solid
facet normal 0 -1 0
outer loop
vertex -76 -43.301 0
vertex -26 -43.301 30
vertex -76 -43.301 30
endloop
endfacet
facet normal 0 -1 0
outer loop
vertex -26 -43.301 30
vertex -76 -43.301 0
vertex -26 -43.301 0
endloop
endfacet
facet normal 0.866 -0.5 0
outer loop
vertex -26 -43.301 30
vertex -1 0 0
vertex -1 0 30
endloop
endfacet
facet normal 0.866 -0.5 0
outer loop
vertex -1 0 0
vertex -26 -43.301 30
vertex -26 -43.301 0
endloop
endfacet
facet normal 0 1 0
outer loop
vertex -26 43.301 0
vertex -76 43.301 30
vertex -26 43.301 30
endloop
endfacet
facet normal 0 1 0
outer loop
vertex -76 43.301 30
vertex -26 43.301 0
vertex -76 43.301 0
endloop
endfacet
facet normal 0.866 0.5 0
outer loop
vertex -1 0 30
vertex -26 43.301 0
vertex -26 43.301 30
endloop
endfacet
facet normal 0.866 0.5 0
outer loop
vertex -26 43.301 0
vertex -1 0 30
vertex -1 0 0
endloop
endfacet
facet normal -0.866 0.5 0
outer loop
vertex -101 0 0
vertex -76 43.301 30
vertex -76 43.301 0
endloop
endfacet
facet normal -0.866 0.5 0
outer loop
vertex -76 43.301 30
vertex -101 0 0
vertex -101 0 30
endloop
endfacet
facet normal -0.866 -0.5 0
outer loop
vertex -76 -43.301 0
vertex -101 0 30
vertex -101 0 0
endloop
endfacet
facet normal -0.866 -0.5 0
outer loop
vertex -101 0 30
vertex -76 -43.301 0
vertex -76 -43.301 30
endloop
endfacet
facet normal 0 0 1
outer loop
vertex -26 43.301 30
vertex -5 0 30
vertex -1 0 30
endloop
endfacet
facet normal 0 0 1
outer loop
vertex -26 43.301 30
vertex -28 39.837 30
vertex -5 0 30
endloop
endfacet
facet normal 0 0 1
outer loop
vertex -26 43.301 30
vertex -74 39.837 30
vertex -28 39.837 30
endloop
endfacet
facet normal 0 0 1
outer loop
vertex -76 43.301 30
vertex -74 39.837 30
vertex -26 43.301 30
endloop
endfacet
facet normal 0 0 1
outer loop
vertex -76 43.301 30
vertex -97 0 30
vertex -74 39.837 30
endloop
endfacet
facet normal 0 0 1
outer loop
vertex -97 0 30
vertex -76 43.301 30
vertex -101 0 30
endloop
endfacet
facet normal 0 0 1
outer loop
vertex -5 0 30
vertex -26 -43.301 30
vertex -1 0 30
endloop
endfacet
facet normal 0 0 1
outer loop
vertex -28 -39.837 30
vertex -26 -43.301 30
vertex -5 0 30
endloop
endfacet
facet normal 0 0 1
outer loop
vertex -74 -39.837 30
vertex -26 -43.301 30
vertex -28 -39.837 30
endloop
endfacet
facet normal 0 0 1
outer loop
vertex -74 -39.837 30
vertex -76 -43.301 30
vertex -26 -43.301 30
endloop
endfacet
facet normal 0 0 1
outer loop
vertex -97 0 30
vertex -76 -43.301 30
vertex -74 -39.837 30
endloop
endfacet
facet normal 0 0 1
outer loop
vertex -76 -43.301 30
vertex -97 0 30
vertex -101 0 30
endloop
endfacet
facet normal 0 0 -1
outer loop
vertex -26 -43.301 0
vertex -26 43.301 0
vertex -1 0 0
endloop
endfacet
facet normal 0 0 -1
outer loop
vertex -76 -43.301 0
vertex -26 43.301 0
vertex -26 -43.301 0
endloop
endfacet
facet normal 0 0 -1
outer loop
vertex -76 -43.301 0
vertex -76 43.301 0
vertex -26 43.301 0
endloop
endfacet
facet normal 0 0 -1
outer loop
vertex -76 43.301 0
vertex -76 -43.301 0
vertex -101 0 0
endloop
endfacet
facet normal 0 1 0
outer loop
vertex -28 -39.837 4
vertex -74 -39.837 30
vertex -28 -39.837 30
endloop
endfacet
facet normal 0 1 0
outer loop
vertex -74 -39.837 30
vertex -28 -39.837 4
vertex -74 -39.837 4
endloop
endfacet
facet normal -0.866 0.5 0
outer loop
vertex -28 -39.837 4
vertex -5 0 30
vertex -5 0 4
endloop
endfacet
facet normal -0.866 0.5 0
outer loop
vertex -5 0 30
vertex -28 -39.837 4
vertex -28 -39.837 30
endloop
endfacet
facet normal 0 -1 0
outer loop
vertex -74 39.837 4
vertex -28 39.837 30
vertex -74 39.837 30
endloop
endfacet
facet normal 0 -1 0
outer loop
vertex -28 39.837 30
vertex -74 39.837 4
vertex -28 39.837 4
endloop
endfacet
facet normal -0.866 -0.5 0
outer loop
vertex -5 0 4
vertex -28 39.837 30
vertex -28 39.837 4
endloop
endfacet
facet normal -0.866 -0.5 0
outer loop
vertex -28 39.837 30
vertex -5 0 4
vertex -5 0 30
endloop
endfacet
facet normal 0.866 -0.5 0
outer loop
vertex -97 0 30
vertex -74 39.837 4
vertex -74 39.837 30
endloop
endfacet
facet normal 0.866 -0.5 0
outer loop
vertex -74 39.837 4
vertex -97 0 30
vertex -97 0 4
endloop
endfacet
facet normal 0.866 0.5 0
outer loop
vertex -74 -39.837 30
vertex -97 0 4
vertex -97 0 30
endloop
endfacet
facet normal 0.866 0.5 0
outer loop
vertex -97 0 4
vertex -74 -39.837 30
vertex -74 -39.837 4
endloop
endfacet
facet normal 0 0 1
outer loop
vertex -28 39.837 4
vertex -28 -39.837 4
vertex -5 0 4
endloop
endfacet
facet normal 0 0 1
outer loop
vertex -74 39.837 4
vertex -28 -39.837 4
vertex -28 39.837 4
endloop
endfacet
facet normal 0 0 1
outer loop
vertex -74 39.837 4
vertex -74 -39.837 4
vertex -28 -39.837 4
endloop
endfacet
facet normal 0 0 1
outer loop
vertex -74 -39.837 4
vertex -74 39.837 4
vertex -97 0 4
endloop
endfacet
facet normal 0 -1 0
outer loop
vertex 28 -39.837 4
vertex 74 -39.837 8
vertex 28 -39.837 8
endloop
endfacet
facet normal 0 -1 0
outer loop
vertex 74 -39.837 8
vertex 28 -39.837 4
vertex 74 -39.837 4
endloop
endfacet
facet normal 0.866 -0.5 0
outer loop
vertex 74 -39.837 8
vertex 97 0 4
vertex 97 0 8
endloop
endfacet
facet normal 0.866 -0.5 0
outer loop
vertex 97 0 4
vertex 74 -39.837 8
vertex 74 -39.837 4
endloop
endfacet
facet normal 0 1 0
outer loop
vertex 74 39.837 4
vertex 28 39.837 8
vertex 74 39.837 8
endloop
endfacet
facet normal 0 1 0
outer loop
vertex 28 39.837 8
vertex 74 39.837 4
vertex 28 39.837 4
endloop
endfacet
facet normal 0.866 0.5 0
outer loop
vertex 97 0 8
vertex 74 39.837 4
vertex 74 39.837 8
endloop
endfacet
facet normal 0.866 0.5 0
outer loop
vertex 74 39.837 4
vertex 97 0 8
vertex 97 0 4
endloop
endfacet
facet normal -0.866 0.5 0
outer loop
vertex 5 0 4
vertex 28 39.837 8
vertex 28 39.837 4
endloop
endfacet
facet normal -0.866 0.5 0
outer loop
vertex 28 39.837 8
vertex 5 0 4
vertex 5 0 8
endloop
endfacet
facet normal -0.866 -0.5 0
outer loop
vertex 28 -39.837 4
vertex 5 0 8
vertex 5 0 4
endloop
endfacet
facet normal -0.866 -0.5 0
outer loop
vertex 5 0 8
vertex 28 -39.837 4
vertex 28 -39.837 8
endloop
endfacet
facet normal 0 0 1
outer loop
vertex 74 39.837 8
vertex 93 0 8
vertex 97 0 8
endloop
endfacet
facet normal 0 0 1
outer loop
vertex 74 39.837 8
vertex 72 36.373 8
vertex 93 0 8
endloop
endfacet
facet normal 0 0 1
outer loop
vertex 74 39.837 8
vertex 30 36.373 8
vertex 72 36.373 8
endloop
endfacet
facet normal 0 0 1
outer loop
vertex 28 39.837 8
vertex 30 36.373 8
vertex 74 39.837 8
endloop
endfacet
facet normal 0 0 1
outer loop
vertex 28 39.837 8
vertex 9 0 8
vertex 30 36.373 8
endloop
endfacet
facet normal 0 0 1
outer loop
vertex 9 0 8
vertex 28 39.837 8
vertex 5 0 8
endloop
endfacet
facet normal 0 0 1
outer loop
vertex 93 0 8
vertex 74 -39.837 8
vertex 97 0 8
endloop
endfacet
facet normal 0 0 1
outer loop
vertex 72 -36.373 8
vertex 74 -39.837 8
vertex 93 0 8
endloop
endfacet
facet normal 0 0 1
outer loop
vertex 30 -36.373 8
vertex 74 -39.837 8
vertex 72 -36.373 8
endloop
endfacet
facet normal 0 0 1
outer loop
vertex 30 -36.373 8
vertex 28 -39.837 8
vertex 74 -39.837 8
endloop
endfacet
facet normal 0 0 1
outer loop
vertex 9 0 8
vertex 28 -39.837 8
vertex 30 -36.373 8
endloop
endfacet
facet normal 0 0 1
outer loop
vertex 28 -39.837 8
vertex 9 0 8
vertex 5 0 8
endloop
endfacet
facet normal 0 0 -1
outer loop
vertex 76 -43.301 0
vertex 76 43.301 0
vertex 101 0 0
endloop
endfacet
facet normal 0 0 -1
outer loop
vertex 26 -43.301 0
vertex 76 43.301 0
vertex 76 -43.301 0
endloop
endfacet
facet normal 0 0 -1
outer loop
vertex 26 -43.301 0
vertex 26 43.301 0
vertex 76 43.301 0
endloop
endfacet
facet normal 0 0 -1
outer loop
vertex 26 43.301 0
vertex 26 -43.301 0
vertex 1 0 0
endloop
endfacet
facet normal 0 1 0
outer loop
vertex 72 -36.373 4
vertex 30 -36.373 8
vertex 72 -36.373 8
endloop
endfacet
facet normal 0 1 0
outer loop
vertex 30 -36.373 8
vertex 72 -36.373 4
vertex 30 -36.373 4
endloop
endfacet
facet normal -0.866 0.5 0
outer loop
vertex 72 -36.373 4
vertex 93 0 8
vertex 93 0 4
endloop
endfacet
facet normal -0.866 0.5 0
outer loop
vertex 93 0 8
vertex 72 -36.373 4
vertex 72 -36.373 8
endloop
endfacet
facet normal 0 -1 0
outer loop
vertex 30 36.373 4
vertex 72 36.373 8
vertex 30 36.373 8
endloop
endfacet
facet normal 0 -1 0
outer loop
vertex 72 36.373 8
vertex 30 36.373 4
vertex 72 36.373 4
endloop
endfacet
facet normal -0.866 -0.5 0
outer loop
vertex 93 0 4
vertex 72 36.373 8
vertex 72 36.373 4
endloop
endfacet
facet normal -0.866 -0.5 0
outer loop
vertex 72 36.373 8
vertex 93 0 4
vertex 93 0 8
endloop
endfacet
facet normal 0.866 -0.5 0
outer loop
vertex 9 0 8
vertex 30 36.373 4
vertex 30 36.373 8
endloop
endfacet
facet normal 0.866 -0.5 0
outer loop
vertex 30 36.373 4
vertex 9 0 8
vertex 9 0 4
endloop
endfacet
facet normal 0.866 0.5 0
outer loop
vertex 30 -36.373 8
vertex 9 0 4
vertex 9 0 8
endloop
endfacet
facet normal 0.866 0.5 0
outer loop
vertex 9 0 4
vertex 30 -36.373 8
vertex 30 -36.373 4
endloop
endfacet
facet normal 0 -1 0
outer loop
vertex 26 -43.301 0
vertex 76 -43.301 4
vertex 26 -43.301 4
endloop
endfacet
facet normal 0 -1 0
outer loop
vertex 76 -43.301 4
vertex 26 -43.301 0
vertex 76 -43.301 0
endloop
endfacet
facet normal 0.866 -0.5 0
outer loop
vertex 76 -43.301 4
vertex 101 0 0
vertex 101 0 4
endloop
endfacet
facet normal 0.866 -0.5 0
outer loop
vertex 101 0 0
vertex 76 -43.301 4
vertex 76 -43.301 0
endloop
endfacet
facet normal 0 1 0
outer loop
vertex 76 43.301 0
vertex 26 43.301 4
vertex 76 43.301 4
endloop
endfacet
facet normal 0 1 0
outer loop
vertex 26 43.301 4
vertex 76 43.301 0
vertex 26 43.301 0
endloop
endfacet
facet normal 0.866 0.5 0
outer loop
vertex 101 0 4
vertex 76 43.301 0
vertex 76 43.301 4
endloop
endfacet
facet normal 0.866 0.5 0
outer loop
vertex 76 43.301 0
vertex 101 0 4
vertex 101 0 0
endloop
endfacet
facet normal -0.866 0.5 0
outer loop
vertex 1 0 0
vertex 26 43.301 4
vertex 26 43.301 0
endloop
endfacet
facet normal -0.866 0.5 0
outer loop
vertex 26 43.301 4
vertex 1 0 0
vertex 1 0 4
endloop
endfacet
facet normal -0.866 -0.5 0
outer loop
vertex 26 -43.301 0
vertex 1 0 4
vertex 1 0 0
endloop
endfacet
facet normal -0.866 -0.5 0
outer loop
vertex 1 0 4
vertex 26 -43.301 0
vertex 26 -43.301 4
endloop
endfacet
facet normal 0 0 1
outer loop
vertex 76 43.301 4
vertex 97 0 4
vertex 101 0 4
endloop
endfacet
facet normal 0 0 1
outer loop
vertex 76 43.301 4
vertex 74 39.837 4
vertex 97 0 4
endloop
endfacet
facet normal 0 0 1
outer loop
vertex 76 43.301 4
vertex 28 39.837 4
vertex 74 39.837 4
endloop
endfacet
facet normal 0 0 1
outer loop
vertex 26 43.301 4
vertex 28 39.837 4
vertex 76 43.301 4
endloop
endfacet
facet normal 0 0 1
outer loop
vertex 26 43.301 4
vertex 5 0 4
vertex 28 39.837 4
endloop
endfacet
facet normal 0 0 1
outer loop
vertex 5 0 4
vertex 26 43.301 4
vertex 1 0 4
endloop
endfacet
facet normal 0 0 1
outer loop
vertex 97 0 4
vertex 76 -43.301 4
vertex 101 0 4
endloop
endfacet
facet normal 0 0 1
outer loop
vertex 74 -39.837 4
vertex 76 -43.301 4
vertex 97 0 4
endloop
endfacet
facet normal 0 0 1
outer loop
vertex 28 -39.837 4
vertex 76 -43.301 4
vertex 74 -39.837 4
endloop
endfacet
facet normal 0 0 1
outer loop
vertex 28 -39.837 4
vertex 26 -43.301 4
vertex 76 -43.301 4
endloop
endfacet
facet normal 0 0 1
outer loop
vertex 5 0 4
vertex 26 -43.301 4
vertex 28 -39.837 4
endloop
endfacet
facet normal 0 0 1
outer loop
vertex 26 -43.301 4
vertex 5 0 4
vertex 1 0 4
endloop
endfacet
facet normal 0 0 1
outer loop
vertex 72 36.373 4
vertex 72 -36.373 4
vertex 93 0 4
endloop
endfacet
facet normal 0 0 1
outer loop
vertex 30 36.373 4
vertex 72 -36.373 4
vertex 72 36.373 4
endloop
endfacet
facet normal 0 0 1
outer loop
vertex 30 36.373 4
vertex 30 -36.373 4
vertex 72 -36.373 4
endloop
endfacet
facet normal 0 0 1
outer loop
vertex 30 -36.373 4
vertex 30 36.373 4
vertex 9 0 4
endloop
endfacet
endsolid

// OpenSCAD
show_options = "both";//[both,box,cap]

//in mm
height = 30;//[1:200]
//in mm
radius = 50;//[1:200]
sided = 6;//[3:100]
//in mm
wallthickness = 4;//[1:20]


if(show_options == "both" || show_options == "box")
translate([show_options == "both" ? -radius - 1 : 0,0,0])
difference(){
	cylinder(h = height, r = radius, $fn = sided);
	translate([0,0,wallthickness])
	cylinder(h = height, r = radius-wallthickness, $fn = sided);
}


if(show_options == "both" || show_options == "cap")
translate([show_options == "both" ? radius + 1 : 0,0,0])
union(){
	cylinder(h = wallthickness, r = radius, $fn = sided);
	difference(){
		cylinder(h = (wallthickness*2), r = radius-wallthickness, $fn = sided);
		translate([0,0,wallthickness-0.1])
			cylinder(h = height, r = radius-(wallthickness*2), $fn = sided);
	}

}
